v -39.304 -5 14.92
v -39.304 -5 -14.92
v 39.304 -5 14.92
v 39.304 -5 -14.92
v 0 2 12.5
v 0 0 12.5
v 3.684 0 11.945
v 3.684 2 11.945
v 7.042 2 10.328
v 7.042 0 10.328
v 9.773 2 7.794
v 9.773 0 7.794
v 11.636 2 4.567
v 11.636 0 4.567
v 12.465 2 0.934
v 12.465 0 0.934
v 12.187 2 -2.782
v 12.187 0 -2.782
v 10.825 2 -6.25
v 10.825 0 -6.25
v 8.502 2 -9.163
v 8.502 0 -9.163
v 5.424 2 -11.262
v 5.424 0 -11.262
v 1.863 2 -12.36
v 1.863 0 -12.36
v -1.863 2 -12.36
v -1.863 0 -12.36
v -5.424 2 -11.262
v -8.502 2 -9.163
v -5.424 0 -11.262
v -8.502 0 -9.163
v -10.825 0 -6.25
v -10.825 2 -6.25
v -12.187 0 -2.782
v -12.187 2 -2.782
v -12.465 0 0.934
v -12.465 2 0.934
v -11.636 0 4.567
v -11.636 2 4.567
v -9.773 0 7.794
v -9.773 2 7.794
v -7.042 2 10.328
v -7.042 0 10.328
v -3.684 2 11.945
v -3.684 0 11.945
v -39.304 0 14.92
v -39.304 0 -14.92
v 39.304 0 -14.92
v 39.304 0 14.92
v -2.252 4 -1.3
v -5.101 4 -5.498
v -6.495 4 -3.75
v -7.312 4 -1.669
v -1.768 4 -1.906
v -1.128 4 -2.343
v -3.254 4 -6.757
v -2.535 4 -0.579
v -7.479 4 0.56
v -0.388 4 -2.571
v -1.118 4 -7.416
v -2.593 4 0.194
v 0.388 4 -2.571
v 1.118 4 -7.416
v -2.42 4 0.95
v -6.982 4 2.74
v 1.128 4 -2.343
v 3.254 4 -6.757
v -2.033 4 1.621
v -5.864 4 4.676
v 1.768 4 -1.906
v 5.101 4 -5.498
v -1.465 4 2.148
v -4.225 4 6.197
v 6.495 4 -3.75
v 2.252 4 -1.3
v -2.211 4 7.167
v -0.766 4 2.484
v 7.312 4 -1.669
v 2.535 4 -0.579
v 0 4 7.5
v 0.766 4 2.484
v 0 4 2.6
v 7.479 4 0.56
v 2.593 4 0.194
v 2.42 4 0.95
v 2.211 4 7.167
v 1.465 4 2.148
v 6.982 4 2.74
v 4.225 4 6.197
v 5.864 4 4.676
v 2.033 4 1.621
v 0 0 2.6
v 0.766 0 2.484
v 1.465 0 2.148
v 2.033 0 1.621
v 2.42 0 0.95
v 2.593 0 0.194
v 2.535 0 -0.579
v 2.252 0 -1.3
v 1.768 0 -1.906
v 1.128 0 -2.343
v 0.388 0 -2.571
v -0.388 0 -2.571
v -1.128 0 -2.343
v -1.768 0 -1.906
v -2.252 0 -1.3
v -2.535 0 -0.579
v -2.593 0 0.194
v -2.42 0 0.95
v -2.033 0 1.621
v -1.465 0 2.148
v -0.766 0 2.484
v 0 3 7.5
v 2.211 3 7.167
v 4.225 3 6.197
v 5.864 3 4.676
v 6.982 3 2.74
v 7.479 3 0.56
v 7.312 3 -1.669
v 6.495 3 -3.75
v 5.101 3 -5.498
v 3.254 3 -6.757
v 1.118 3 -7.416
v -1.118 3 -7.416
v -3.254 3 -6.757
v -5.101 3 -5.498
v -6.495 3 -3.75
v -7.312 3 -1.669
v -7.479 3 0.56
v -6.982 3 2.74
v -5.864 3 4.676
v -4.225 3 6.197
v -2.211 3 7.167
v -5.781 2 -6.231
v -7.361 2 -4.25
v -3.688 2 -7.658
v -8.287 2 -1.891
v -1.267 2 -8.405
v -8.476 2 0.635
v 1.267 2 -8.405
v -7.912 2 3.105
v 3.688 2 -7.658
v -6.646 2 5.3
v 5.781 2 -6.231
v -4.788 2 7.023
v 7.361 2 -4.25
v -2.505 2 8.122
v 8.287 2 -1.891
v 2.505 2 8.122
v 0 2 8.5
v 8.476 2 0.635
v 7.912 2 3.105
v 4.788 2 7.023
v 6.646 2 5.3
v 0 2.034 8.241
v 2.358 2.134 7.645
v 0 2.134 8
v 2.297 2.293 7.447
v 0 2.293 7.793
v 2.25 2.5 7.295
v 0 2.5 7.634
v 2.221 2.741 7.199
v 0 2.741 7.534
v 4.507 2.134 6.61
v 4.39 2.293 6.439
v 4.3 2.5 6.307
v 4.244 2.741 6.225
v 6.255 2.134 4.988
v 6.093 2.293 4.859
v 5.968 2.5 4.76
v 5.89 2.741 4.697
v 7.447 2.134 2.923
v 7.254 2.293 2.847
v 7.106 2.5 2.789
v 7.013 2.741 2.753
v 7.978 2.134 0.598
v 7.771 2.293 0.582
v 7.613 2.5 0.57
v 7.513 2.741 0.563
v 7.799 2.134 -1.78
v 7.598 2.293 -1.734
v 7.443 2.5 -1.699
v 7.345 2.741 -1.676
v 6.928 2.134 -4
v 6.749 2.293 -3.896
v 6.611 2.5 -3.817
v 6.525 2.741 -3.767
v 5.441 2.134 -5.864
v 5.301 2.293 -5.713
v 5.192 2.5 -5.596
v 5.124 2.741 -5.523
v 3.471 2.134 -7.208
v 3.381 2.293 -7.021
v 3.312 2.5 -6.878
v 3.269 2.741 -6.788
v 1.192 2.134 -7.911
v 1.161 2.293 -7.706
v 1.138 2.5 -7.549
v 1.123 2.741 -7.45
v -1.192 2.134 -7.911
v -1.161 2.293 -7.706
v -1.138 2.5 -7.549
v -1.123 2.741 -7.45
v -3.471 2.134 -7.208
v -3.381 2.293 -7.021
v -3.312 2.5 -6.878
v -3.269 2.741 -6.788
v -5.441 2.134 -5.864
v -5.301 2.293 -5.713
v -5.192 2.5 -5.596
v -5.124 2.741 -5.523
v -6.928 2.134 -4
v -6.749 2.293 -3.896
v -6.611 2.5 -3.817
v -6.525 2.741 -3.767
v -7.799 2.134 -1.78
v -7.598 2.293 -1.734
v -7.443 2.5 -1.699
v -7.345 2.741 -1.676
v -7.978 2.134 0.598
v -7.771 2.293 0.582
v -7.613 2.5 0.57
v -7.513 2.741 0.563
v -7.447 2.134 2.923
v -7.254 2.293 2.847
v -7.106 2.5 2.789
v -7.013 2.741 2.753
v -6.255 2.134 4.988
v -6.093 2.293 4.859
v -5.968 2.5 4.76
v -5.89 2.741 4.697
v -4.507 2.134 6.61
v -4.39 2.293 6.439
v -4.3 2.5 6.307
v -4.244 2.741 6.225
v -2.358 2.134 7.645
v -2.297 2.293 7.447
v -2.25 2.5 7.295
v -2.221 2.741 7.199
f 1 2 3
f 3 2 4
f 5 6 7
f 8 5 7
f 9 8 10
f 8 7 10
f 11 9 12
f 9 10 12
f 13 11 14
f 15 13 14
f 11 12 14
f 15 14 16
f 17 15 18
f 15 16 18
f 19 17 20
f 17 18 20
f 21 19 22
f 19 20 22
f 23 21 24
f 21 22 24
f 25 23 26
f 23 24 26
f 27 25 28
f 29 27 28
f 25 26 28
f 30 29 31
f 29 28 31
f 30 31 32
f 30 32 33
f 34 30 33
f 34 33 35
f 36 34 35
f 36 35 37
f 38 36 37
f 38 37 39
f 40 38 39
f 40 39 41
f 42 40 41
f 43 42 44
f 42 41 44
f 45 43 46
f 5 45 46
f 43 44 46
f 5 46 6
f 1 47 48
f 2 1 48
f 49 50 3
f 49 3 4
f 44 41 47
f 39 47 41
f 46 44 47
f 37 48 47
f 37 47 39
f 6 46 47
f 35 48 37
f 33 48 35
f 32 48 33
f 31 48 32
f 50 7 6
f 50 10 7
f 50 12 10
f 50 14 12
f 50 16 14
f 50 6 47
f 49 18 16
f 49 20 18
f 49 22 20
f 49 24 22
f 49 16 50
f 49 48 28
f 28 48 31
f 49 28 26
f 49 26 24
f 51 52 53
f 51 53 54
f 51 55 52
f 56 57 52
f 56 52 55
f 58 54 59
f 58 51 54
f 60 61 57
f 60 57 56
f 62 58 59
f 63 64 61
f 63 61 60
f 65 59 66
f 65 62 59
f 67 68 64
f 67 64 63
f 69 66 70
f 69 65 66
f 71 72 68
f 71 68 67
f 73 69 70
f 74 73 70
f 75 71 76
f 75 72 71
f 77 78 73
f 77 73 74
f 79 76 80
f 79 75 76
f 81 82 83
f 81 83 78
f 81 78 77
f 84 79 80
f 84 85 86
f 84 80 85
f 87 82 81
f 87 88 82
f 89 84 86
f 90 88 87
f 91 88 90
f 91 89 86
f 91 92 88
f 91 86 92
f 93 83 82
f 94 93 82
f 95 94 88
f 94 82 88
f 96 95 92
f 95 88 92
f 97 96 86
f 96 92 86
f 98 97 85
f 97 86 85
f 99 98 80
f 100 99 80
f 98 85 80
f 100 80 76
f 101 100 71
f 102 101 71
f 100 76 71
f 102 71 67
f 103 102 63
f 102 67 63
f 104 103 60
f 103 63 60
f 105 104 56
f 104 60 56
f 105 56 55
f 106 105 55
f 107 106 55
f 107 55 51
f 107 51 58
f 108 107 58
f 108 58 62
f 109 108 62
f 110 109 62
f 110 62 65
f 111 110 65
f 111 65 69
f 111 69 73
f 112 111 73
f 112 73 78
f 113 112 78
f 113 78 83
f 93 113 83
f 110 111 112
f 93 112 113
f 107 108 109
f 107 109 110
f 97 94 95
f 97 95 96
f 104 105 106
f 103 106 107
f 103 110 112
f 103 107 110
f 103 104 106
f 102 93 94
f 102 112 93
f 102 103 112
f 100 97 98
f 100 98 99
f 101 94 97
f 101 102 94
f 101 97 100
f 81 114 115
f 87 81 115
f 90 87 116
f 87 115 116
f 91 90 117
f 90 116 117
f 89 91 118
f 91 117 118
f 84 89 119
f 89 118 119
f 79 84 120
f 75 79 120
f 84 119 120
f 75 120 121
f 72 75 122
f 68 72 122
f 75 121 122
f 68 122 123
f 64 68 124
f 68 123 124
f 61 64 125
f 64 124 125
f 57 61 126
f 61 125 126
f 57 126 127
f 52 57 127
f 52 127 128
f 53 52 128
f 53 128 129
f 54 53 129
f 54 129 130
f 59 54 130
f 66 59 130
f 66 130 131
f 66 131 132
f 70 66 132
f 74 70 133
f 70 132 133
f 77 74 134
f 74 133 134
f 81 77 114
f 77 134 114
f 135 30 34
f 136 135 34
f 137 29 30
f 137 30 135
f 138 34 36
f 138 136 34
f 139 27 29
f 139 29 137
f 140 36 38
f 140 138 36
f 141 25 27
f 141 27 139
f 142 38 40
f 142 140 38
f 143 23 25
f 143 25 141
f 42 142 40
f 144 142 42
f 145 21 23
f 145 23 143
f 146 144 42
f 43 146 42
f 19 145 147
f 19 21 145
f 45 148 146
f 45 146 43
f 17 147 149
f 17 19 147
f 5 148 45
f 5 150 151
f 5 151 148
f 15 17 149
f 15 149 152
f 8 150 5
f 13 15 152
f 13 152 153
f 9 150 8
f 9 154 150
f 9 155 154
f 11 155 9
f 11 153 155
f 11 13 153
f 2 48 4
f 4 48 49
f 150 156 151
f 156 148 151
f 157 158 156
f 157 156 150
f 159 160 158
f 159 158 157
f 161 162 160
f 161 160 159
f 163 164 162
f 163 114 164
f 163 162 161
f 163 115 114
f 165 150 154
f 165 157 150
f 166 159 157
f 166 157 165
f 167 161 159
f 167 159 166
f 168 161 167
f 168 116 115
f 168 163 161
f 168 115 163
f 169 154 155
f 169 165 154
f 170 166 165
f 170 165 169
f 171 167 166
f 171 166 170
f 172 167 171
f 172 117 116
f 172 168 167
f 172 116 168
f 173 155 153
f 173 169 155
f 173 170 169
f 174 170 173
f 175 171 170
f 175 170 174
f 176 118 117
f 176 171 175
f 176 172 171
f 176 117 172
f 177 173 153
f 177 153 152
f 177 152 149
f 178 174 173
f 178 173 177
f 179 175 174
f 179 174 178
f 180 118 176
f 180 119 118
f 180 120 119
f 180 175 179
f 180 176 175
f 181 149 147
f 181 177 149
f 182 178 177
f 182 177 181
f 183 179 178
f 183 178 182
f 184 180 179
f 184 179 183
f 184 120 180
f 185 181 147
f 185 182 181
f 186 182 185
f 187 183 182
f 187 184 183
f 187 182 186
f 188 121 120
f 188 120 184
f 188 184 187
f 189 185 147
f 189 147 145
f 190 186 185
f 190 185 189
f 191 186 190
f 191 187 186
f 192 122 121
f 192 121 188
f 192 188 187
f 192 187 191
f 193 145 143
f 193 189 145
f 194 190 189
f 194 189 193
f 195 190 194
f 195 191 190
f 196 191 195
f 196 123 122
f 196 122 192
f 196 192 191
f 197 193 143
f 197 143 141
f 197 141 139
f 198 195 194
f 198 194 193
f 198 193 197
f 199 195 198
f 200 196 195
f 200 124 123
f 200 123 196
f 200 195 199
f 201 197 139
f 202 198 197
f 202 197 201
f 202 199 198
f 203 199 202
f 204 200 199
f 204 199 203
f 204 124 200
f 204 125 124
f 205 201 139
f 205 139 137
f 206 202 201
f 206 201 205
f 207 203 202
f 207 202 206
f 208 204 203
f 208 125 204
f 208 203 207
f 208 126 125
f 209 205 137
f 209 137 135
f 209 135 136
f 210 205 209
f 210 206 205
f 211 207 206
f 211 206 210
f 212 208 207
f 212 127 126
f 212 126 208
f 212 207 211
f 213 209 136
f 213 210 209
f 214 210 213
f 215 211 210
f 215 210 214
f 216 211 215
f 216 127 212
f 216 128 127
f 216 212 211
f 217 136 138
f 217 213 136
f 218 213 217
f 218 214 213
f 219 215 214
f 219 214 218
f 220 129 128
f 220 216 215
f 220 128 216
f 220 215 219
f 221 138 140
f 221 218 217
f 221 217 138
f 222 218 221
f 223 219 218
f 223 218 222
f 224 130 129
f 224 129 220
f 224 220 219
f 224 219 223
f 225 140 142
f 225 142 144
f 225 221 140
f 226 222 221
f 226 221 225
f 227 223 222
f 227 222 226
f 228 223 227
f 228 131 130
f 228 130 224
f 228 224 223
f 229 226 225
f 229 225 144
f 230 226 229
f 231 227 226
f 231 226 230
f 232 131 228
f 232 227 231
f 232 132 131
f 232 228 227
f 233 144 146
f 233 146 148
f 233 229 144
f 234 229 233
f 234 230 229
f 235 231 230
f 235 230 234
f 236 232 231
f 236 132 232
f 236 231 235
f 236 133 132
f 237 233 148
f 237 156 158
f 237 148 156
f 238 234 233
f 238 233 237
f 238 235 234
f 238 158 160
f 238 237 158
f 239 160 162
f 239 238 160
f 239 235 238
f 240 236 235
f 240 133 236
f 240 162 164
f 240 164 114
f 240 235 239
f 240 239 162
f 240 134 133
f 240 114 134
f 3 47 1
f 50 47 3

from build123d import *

# Parameters (mm, degrees)
SKETCH_1_R          = 12.5
EXTRUDE_1_DEPTH     = 2
SKETCH_2_R          = 7.5
EXTRUDE_2_DEPTH     = 2
FILLET_1_R          = 1
CUT_EXTRUDE_1_REACH = 20.125
SKETCH_3_R          = 2.6
SKETCH_4_W          = 78.608538246
SKETCH_4_H          = 29.839159416
EXTRUDE_3_DEPTH     = 5


with BuildPart() as part:
    # 草图1 → 凸台-拉伸1 (new body)
    with BuildSketch(Plane(origin=(0, 0, 0), x_dir=(1, 0, 0), z_dir=(0, 1, 0))):
        with Locations(Location((0, 0, 0), (0, 0, 270))):
            Circle(SKETCH_1_R)
    extrude(amount=EXTRUDE_1_DEPTH)

    # 草图2 → 凸台-拉伸2 (add)
    with BuildSketch(Plane(origin=(0, 2, 0), x_dir=(1, 0, 0), z_dir=(0, 1, 0))):
        with Locations(Location((0, 0, 0), (0, 0, 270))):
            Circle(SKETCH_2_R)
    extrude(amount=EXTRUDE_2_DEPTH)

    # 圆角1
    fillet_1_edges = [part.edges().sort_by_distance(p)[0] for p in [
        (0, 2, -7.5),
    ]]
    fillet(fillet_1_edges, radius=FILLET_1_R)

    # 草图3 → 切除-拉伸1 (cut, up to next)
    with BuildSketch(Plane(origin=(0, 4, 0), x_dir=(1, 0, 0), z_dir=(0, 1, 0)), mode=Mode.PRIVATE) as cut_extrude_1_sk1:
        with Locations(Location((0, 0, 0), (0, 0, 270))):
            Circle(SKETCH_3_R)
    cut_extrude_1_tool1 = extrude(cut_extrude_1_sk1.sketch, amount=-CUT_EXTRUDE_1_REACH, mode=Mode.PRIVATE) & part.part
    add(cut_extrude_1_tool1.solids().sort_by_distance((0, 4, 0))[0], mode=Mode.SUBTRACT)

    # 草图4 → 凸台-拉伸3 (add)
    with BuildSketch(Plane(origin=(0, 0, 0), x_dir=(1, 0, 0), z_dir=(0, 1, 0))):
        Rectangle(SKETCH_4_W, SKETCH_4_H)
    extrude(amount=-EXTRUDE_3_DEPTH)


solid = part.part
